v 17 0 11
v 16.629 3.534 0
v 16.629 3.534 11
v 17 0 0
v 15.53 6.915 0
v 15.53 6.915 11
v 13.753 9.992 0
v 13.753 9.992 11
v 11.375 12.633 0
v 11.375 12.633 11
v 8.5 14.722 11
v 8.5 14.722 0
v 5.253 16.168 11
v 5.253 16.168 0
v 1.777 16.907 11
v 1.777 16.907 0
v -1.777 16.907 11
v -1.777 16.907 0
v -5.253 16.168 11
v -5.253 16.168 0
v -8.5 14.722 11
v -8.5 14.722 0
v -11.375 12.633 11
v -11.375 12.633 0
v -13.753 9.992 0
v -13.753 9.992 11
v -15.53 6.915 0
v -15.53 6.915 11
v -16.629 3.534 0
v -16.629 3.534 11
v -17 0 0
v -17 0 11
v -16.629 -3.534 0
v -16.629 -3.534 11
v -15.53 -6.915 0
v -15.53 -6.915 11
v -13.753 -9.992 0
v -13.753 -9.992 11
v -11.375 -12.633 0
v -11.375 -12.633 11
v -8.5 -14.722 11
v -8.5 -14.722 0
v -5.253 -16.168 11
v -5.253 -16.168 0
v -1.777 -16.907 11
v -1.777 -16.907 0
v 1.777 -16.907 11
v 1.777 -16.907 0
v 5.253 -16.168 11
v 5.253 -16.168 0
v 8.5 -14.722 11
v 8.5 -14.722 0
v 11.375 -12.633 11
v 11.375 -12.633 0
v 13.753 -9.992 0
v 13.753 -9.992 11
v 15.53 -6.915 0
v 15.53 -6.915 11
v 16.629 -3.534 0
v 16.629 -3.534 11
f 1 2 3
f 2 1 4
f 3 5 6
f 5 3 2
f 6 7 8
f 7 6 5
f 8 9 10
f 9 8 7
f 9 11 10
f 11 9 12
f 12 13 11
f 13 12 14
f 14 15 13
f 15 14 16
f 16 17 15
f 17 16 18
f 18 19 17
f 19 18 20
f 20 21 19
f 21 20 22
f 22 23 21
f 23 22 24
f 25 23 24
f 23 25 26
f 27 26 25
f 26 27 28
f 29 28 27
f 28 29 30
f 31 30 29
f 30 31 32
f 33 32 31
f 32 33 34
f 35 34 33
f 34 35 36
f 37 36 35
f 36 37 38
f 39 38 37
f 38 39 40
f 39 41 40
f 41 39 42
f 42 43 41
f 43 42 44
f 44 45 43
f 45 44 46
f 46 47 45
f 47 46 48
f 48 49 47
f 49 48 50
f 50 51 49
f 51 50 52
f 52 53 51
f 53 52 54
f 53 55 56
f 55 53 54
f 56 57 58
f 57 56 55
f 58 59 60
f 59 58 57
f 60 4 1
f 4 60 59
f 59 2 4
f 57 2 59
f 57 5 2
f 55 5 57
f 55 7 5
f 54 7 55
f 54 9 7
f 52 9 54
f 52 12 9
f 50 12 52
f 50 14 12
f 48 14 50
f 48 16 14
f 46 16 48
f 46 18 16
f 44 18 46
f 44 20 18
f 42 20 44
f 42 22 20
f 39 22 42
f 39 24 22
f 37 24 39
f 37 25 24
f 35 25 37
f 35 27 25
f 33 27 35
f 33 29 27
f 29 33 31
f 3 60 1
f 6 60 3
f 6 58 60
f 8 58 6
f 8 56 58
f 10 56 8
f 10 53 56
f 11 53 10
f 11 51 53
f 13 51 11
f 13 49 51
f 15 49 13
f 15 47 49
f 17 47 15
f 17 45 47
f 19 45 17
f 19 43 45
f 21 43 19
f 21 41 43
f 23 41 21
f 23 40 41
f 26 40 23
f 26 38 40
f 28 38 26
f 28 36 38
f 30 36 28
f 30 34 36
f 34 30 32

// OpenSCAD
// Generated by SolidPython 1.0.1 on 2020-07-29 00:46:44


cylinder(h = 11, r1 = 17, r2 = 17);
/***********************************************
*********      SolidPython code:      **********
************************************************
 
# import packages: SolidPython
from solid import *
from solid.utils import *
from itertools import chain, combinations, permutations


class Resize:

    def __init__(self, scad_file):
        self.scad_file = scad_file
        #self.scad_file = import_scad(scad_file)
        # cone/cylinder param:
        self.r1 = 0
        self.r2 = 0
        self.h = 0
        # rectangular prism param:
        self.w = 0
        self.l = 0
        # ellipse param:
        self.r = 0

    # import OpenScad code (file name corresponds to shape)


    # classify shape + parameters
    def assign(self, param1, param2, param3):
        if self.scad_file == 'cone.scad':
            self.r1 = param1
            self.r2 = param2
            self.h = param3
        elif self.scad_file == 'cylinder.scad':
            self.r1 = param1
            self.r2 = param2
            self.h = param3
        elif self.scad_file == 'rectangularPrism.scad':
            self.h = param1
            self.l = param2
            self.w = param3
        else:
            self.r = param1
            self.h = param2

    # resize parameters
    def iterate(self):
        x = range(3, 20, 2)
        i = 1
        if self.scad_file == 'cone.scad':
            tempList = list(permutations(x, 2))
            for temp in tempList:
                param1 = temp[0]
                param2 = temp[1]
                filepath = 'produced_scad_files/' + 'cone' + str(param1) + '_' + str(param2) + '_' + '.scad'
                scad_render_to_file(cylinder(h=param1, r1=param2, r2=0), filepath)

        elif self.scad_file == 'cylinder.scad':
            tempList = list(permutations(x, 3))
            for temp in tempList:
                param1 = temp[0]
                param2 = temp[1]
                filepath = 'produced_scad_files/' + 'cylinder' + str(param1) + '_' + str(param2) + '_' + '.scad'
                scad_render_to_file(cylinder(h=param1, r1=param2, r2=param2), filepath)

        elif self.scad_file == 'rectangularPrism.scad':
            tempList = list(permutations(x, 3))
            for temp in tempList:
                param1 = temp[0]
                param2 = temp[1]
                param3 = temp[2]
                filepath = 'produced_scad_files/' + 'rectangularPrism' + str(param1) + '_' + str(param2) + '_' + str(
                    param3) + '.scad'
                scad_render_to_file(cube(size=(param1, param2, param3)), filepath)

        elif self.scad_file == 'ellipse.scad':
            tempList = list(permutations(x, 4))
            for temp in tempList:
                param1 = temp[0]
                param2 = temp[1]
                param3 = temp[2]
                param4 = temp[3]
                filepath = 'produced_scad_files/' + 'ellipse' + str(param1) + '_' + str(param2) + '_' + str(param3) + '_' + str(param4) + '.scad'
                scad_render_to_file(scale([param1, param2, param3])(sphere(r=param4)), filepath)

    def render_to_scadfile(self):
        scad_render_to_file(scad, 'example.scad') 
 
************************************************/
